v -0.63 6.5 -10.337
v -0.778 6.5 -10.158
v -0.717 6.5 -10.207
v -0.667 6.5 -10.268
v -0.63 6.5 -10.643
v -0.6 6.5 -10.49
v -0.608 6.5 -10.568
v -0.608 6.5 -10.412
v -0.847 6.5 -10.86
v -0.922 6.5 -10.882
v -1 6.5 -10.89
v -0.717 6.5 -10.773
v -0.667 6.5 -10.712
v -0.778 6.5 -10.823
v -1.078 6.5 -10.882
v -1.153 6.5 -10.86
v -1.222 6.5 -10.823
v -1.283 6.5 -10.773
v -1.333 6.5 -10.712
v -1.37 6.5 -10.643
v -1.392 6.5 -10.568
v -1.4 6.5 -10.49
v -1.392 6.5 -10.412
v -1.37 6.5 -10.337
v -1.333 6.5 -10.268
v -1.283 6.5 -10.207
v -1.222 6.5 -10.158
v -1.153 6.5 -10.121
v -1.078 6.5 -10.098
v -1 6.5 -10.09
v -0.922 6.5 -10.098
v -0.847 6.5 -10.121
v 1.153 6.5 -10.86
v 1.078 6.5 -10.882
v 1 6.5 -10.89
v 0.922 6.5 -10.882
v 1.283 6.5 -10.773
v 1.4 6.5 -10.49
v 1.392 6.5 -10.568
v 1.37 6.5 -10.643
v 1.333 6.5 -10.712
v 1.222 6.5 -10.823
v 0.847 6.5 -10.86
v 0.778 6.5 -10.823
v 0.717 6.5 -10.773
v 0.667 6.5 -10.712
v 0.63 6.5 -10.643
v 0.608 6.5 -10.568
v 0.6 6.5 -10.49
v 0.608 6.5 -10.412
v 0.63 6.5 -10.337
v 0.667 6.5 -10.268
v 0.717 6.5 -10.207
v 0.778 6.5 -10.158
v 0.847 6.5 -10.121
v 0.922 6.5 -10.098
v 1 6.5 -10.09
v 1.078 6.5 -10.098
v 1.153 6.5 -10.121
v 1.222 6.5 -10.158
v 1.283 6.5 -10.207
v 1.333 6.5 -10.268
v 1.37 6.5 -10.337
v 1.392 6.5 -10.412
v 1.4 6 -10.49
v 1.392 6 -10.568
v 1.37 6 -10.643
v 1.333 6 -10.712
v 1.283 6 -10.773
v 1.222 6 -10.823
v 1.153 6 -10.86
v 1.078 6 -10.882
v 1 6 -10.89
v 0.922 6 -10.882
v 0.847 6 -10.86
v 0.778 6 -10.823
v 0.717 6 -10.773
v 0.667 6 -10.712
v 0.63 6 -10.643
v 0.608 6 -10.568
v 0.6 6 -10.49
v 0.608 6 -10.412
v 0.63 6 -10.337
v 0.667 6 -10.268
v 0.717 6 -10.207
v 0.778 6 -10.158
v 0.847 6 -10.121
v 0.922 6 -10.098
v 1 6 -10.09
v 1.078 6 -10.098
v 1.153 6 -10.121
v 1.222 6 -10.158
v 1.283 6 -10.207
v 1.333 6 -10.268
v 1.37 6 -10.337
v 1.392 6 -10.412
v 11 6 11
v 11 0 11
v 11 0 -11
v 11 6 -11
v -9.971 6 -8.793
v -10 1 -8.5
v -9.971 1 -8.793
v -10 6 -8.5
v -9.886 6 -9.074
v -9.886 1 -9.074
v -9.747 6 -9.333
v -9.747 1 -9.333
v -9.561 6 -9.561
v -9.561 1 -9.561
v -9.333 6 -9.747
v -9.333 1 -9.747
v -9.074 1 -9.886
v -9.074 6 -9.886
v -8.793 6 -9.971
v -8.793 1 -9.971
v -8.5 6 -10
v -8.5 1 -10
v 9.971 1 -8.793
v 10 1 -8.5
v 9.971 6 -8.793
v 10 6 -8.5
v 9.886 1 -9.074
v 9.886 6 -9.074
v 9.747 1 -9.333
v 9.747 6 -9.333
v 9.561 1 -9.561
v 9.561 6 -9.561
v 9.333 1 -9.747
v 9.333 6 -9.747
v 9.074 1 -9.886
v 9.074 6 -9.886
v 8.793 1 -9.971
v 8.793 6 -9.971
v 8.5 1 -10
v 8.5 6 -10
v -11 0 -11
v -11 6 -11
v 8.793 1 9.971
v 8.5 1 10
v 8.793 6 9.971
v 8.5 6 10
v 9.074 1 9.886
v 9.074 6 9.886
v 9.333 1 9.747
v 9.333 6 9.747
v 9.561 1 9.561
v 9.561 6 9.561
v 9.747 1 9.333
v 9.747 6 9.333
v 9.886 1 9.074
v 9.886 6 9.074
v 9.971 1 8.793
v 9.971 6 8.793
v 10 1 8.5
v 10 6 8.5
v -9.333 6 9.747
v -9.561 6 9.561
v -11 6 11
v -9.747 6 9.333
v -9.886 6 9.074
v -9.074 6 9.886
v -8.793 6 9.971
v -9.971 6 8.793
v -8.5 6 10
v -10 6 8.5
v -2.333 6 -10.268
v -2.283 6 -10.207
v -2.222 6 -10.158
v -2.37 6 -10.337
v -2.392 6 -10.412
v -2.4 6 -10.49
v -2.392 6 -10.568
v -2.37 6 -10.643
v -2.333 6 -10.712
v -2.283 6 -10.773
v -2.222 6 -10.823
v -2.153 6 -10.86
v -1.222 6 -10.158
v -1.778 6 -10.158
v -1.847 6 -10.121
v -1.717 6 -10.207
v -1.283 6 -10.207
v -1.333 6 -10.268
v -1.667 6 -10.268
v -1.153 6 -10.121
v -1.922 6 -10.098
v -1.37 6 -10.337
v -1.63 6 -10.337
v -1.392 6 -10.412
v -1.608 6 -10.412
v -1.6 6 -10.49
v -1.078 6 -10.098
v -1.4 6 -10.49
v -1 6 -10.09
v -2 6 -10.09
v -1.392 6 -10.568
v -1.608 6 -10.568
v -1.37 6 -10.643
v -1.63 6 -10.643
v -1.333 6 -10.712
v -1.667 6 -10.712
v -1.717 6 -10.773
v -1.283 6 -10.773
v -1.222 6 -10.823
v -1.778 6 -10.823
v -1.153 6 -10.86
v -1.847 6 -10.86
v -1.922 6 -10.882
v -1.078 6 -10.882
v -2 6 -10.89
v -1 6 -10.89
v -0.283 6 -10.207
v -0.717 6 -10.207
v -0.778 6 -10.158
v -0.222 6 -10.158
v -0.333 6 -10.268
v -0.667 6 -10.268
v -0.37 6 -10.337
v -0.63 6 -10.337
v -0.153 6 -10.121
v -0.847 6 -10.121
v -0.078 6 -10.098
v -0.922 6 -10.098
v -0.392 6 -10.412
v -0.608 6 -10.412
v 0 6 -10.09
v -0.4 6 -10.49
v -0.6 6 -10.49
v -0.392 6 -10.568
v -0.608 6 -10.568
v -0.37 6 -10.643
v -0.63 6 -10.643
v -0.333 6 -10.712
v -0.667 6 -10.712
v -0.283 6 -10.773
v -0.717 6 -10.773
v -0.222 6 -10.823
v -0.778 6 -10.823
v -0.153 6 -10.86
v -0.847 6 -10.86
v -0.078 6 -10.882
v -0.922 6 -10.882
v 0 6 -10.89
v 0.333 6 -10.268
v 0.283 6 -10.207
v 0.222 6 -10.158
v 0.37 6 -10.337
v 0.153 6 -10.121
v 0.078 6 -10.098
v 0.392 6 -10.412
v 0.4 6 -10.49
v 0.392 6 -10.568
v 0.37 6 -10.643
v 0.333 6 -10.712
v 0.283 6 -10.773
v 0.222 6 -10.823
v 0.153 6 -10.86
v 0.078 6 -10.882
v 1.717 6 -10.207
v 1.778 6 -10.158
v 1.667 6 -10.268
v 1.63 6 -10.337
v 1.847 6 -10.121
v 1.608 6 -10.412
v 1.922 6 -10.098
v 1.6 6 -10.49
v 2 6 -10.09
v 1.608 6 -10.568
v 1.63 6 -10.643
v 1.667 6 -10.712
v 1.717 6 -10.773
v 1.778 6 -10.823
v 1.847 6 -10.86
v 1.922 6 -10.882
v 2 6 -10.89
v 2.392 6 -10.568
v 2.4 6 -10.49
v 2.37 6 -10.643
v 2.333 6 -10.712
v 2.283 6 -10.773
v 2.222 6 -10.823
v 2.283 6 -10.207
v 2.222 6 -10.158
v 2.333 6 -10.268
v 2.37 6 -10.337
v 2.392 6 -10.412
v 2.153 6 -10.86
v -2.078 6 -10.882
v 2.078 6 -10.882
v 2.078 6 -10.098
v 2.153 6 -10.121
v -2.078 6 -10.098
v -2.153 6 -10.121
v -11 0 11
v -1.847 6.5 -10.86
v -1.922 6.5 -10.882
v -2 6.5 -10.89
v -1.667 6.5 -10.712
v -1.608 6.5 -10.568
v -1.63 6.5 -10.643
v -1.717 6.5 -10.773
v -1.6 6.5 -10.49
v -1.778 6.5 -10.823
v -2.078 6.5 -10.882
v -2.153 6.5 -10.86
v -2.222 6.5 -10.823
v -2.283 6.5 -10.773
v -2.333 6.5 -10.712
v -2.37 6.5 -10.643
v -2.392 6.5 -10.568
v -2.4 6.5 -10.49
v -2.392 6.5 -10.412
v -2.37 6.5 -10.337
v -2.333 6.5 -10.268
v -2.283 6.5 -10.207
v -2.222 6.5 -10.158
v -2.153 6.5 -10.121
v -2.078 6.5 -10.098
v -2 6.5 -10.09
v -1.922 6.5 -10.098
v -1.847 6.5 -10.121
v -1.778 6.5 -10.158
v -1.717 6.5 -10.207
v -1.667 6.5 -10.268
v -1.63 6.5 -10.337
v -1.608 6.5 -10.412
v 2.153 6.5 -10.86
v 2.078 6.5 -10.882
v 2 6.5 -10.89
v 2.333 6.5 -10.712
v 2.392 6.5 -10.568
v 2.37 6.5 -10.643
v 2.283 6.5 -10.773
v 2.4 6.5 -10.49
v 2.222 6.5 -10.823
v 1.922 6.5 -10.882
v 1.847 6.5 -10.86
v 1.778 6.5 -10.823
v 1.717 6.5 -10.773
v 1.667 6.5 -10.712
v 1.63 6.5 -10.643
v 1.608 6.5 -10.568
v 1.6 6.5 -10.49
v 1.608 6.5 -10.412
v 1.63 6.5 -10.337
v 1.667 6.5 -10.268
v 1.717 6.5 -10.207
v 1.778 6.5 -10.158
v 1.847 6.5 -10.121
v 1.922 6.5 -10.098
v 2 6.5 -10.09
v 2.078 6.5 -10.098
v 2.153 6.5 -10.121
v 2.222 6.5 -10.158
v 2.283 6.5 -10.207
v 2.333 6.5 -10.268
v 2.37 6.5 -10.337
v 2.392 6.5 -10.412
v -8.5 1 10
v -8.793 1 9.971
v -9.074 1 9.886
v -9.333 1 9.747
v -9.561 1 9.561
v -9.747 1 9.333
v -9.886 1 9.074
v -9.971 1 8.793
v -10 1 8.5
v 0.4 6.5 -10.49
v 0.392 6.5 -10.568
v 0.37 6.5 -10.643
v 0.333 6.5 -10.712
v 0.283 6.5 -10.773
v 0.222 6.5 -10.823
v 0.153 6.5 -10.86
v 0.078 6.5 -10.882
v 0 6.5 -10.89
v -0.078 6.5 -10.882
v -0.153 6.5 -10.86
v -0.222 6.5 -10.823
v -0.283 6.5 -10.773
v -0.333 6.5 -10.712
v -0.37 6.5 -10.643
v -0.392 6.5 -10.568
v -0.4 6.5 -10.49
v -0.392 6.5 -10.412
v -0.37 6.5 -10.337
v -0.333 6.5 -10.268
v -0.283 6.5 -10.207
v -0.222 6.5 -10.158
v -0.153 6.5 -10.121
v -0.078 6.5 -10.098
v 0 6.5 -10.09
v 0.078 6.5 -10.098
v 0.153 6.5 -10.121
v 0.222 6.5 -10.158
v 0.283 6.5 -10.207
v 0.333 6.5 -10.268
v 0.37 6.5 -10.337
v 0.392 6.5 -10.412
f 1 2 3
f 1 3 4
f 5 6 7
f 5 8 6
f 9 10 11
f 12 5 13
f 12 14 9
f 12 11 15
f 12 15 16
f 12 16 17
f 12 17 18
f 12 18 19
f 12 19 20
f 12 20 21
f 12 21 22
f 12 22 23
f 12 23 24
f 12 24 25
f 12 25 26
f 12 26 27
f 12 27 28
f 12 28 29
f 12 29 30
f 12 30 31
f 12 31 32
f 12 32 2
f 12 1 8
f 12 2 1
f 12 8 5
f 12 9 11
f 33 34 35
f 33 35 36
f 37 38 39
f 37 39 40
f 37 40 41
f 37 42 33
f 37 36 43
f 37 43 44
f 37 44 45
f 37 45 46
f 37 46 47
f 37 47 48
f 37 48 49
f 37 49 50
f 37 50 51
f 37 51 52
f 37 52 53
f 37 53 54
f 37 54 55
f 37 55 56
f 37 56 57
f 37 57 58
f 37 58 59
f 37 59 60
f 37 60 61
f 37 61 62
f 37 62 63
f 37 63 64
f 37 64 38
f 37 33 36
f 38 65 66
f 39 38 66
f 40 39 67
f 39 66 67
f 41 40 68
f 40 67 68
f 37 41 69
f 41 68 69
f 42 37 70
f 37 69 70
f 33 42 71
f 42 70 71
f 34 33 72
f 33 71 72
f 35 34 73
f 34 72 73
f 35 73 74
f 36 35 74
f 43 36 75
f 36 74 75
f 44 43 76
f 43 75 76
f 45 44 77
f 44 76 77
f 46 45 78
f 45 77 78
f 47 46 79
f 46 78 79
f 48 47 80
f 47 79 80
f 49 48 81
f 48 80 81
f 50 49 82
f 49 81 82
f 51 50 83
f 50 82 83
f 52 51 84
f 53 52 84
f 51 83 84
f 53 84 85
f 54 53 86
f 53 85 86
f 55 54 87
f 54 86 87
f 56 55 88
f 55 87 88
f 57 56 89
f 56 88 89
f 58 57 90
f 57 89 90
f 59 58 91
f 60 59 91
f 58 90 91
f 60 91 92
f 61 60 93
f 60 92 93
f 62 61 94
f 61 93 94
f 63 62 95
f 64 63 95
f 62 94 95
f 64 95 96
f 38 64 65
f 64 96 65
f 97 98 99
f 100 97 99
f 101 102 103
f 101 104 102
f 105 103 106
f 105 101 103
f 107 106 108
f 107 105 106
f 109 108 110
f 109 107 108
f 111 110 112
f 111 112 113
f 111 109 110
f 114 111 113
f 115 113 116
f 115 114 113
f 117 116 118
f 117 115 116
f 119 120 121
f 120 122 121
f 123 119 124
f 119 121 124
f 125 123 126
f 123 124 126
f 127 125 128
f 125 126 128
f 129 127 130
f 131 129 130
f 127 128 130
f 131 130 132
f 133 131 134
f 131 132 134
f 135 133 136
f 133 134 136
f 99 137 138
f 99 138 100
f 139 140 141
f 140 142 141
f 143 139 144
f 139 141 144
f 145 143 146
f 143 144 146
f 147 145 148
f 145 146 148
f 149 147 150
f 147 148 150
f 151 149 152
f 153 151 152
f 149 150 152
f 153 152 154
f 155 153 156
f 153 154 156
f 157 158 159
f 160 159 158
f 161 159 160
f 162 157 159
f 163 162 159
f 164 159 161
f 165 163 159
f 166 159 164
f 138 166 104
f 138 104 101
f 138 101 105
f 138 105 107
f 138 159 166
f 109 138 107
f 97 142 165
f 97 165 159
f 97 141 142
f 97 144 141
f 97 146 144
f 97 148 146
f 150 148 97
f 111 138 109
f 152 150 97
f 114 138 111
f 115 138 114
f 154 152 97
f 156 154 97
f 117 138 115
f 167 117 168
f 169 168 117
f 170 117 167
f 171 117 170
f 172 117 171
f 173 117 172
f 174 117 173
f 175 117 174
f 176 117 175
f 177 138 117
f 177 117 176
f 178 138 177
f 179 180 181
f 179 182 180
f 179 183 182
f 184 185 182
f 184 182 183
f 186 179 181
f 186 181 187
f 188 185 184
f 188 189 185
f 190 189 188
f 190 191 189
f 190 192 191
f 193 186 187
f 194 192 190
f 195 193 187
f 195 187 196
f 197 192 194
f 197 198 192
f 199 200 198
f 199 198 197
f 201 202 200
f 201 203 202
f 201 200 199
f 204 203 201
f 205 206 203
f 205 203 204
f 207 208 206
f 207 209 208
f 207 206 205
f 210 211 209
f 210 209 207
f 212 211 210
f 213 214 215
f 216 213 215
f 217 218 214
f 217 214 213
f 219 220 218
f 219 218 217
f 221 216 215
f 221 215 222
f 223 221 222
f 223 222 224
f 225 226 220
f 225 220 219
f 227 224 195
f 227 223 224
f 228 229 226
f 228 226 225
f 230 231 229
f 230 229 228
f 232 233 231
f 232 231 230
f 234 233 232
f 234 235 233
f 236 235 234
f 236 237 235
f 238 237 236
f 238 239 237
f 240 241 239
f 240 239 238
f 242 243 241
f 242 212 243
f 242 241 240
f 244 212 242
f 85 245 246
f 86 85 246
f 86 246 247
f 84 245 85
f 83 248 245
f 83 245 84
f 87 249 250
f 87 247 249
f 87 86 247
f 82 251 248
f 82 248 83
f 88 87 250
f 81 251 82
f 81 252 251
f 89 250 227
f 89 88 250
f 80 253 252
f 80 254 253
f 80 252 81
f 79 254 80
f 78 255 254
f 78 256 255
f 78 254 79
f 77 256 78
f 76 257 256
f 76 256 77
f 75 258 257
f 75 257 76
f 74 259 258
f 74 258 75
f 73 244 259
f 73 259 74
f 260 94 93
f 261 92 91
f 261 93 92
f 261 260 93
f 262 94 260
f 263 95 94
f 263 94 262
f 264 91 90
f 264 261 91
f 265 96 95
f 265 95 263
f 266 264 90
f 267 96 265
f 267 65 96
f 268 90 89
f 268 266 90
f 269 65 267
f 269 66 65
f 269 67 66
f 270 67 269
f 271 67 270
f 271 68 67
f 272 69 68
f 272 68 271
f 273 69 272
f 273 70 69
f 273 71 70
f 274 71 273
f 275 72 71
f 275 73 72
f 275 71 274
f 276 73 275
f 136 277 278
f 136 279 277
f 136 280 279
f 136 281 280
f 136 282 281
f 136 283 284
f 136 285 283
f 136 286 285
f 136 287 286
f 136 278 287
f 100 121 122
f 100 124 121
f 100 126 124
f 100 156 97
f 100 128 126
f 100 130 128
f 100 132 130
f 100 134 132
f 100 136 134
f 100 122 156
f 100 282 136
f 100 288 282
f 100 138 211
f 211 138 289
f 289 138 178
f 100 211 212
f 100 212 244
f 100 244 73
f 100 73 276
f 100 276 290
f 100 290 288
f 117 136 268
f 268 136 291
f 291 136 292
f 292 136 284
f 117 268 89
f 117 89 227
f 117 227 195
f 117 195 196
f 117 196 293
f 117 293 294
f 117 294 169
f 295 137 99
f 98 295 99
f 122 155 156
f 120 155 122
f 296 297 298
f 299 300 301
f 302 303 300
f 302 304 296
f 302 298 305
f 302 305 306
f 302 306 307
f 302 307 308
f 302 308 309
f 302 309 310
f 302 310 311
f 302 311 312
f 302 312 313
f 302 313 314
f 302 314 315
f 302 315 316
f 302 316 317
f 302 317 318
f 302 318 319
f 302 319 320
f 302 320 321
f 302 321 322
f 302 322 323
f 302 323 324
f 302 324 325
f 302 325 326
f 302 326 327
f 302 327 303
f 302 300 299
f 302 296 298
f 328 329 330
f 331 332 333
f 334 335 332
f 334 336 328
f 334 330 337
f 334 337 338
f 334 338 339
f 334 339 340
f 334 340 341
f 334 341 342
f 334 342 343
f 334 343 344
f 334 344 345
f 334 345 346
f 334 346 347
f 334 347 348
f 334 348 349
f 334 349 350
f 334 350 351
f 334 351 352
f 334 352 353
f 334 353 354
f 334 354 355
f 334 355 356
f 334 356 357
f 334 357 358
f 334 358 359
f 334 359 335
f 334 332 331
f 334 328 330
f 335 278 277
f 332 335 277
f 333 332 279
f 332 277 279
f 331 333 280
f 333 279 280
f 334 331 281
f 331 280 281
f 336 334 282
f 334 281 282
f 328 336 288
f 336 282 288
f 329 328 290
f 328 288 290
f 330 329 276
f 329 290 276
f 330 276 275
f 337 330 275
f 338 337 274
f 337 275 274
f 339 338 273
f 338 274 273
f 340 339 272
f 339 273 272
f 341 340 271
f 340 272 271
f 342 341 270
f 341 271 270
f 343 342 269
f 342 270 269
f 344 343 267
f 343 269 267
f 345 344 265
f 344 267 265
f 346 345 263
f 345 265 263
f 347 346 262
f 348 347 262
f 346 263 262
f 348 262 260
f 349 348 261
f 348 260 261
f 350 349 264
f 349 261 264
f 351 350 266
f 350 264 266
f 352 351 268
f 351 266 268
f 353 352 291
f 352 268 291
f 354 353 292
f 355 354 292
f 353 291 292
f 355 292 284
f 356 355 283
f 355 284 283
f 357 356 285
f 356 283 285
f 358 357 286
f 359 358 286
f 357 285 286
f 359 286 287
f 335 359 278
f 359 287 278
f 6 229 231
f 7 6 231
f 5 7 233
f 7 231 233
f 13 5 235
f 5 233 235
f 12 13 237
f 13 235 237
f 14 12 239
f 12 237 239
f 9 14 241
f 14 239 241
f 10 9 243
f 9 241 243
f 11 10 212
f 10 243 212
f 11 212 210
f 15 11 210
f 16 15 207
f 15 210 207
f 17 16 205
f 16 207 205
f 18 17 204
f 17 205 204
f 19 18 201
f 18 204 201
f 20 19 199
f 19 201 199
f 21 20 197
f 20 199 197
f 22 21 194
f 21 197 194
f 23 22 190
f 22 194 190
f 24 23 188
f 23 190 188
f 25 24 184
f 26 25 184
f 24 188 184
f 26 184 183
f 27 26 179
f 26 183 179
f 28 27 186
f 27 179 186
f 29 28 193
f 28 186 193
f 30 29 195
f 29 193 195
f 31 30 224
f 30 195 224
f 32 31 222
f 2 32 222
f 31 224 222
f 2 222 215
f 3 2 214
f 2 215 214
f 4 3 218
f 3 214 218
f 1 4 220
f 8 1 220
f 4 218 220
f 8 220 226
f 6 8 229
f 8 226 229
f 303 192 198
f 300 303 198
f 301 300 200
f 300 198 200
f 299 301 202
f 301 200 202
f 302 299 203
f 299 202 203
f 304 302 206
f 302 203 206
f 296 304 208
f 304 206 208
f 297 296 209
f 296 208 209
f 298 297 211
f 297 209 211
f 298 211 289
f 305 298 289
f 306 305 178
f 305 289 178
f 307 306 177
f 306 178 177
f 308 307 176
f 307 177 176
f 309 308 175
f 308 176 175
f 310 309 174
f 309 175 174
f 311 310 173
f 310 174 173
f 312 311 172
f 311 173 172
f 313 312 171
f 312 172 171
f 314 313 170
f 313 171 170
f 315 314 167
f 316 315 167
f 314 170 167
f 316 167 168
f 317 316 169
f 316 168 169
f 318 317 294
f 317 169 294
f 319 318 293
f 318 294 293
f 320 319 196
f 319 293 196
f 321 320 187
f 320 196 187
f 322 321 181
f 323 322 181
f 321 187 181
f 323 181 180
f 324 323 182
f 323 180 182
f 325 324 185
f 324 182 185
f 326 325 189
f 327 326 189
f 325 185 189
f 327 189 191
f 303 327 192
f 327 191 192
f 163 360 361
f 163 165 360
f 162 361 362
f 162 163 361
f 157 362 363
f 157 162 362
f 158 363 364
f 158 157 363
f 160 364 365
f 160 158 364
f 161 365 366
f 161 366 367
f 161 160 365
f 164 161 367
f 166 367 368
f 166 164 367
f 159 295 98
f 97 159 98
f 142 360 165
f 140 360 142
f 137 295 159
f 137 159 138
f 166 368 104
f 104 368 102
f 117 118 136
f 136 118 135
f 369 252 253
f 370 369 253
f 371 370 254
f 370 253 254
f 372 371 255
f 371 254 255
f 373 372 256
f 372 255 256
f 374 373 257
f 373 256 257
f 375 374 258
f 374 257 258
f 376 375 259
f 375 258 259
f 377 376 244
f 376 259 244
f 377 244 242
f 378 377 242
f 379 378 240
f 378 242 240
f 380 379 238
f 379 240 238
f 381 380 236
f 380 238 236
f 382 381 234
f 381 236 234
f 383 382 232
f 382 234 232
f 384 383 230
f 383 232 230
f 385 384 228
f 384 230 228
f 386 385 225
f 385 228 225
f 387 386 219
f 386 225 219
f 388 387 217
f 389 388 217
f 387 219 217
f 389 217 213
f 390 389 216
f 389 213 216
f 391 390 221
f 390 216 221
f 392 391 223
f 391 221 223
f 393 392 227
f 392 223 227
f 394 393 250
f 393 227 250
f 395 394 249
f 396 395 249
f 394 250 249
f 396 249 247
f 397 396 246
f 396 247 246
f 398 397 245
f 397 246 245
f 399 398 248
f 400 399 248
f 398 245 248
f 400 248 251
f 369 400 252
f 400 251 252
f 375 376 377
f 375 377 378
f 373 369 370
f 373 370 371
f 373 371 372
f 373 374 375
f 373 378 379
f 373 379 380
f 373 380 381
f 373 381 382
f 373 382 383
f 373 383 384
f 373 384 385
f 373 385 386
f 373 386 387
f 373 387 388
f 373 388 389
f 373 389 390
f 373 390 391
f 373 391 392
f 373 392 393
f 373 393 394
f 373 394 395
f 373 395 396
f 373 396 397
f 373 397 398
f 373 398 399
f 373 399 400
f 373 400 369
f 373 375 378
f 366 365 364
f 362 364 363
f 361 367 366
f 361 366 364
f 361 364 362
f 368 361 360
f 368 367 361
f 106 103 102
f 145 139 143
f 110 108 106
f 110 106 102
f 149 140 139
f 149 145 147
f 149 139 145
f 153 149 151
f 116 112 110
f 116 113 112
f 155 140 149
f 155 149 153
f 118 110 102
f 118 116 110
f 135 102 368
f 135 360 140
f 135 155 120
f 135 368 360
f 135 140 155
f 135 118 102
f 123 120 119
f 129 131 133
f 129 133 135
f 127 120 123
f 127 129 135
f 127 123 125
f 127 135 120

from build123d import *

# Parameters (mm, degrees)
SKETCH1_W           = 20
SKETCH1_H           = 20
BOSS_EXTRUDE2_DEPTH = 1
SKETCH1_6_W         = 22
SKETCH1_6_H         = 22
SKETCH1_6_W_2       = 20
SKETCH1_6_H_2       = 20
BOSS_EXTRUDE3_DEPTH = 6
SKETCH2_R           = 0.4
BOSS_EXTRUDE4_DEPTH = 0.5
FILLET1_R           = 1.5


with BuildPart() as part:
    # Sketch1 → Boss-Extrude2 (new body)
    with BuildSketch(Plane(origin=(0, 0, 0), x_dir=(1, 0, 0), z_dir=(0, 1, 0))):
        Rectangle(SKETCH1_W, SKETCH1_H)
    extrude(amount=BOSS_EXTRUDE2_DEPTH)

    # Sketch1<6> → Boss-Extrude3 (add)
    with BuildSketch(Plane(origin=(0, 0, 0), x_dir=(1, 0, 0), z_dir=(0, 1, 0))):
        Rectangle(SKETCH1_6_W, SKETCH1_6_H)
        Rectangle(SKETCH1_6_W_2, SKETCH1_6_H_2, mode=Mode.SUBTRACT)
    extrude(amount=BOSS_EXTRUDE3_DEPTH)

    # Sketch2 → Boss-Extrude4 (add)
    with BuildSketch(Plane(origin=(0, 6, 0), x_dir=(1, 0, 0), z_dir=(0, 1, 0))):
        with Locations((0, 10.490155688)):
            Circle(SKETCH2_R)
        with Locations((1, 10.490155688)):
            Circle(SKETCH2_R)
        with Locations((-1, 10.490155688)):
            Circle(SKETCH2_R)
        with Locations((-2, 10.490155688)):
            Circle(SKETCH2_R)
        with Locations((2, 10.490155688)):
            Circle(SKETCH2_R)
    extrude(amount=BOSS_EXTRUDE4_DEPTH)

    # Fillet1
    fillet1_edges = [part.edges().sort_by_distance(p)[0] for p in [
        (10, 3.5, -10),
        (-10, 3.5, -10),
        (-10, 3.5, 10),
        (10, 3.5, 10),
    ]]
    fillet(fillet1_edges, radius=FILLET1_R)


solid = part.part
